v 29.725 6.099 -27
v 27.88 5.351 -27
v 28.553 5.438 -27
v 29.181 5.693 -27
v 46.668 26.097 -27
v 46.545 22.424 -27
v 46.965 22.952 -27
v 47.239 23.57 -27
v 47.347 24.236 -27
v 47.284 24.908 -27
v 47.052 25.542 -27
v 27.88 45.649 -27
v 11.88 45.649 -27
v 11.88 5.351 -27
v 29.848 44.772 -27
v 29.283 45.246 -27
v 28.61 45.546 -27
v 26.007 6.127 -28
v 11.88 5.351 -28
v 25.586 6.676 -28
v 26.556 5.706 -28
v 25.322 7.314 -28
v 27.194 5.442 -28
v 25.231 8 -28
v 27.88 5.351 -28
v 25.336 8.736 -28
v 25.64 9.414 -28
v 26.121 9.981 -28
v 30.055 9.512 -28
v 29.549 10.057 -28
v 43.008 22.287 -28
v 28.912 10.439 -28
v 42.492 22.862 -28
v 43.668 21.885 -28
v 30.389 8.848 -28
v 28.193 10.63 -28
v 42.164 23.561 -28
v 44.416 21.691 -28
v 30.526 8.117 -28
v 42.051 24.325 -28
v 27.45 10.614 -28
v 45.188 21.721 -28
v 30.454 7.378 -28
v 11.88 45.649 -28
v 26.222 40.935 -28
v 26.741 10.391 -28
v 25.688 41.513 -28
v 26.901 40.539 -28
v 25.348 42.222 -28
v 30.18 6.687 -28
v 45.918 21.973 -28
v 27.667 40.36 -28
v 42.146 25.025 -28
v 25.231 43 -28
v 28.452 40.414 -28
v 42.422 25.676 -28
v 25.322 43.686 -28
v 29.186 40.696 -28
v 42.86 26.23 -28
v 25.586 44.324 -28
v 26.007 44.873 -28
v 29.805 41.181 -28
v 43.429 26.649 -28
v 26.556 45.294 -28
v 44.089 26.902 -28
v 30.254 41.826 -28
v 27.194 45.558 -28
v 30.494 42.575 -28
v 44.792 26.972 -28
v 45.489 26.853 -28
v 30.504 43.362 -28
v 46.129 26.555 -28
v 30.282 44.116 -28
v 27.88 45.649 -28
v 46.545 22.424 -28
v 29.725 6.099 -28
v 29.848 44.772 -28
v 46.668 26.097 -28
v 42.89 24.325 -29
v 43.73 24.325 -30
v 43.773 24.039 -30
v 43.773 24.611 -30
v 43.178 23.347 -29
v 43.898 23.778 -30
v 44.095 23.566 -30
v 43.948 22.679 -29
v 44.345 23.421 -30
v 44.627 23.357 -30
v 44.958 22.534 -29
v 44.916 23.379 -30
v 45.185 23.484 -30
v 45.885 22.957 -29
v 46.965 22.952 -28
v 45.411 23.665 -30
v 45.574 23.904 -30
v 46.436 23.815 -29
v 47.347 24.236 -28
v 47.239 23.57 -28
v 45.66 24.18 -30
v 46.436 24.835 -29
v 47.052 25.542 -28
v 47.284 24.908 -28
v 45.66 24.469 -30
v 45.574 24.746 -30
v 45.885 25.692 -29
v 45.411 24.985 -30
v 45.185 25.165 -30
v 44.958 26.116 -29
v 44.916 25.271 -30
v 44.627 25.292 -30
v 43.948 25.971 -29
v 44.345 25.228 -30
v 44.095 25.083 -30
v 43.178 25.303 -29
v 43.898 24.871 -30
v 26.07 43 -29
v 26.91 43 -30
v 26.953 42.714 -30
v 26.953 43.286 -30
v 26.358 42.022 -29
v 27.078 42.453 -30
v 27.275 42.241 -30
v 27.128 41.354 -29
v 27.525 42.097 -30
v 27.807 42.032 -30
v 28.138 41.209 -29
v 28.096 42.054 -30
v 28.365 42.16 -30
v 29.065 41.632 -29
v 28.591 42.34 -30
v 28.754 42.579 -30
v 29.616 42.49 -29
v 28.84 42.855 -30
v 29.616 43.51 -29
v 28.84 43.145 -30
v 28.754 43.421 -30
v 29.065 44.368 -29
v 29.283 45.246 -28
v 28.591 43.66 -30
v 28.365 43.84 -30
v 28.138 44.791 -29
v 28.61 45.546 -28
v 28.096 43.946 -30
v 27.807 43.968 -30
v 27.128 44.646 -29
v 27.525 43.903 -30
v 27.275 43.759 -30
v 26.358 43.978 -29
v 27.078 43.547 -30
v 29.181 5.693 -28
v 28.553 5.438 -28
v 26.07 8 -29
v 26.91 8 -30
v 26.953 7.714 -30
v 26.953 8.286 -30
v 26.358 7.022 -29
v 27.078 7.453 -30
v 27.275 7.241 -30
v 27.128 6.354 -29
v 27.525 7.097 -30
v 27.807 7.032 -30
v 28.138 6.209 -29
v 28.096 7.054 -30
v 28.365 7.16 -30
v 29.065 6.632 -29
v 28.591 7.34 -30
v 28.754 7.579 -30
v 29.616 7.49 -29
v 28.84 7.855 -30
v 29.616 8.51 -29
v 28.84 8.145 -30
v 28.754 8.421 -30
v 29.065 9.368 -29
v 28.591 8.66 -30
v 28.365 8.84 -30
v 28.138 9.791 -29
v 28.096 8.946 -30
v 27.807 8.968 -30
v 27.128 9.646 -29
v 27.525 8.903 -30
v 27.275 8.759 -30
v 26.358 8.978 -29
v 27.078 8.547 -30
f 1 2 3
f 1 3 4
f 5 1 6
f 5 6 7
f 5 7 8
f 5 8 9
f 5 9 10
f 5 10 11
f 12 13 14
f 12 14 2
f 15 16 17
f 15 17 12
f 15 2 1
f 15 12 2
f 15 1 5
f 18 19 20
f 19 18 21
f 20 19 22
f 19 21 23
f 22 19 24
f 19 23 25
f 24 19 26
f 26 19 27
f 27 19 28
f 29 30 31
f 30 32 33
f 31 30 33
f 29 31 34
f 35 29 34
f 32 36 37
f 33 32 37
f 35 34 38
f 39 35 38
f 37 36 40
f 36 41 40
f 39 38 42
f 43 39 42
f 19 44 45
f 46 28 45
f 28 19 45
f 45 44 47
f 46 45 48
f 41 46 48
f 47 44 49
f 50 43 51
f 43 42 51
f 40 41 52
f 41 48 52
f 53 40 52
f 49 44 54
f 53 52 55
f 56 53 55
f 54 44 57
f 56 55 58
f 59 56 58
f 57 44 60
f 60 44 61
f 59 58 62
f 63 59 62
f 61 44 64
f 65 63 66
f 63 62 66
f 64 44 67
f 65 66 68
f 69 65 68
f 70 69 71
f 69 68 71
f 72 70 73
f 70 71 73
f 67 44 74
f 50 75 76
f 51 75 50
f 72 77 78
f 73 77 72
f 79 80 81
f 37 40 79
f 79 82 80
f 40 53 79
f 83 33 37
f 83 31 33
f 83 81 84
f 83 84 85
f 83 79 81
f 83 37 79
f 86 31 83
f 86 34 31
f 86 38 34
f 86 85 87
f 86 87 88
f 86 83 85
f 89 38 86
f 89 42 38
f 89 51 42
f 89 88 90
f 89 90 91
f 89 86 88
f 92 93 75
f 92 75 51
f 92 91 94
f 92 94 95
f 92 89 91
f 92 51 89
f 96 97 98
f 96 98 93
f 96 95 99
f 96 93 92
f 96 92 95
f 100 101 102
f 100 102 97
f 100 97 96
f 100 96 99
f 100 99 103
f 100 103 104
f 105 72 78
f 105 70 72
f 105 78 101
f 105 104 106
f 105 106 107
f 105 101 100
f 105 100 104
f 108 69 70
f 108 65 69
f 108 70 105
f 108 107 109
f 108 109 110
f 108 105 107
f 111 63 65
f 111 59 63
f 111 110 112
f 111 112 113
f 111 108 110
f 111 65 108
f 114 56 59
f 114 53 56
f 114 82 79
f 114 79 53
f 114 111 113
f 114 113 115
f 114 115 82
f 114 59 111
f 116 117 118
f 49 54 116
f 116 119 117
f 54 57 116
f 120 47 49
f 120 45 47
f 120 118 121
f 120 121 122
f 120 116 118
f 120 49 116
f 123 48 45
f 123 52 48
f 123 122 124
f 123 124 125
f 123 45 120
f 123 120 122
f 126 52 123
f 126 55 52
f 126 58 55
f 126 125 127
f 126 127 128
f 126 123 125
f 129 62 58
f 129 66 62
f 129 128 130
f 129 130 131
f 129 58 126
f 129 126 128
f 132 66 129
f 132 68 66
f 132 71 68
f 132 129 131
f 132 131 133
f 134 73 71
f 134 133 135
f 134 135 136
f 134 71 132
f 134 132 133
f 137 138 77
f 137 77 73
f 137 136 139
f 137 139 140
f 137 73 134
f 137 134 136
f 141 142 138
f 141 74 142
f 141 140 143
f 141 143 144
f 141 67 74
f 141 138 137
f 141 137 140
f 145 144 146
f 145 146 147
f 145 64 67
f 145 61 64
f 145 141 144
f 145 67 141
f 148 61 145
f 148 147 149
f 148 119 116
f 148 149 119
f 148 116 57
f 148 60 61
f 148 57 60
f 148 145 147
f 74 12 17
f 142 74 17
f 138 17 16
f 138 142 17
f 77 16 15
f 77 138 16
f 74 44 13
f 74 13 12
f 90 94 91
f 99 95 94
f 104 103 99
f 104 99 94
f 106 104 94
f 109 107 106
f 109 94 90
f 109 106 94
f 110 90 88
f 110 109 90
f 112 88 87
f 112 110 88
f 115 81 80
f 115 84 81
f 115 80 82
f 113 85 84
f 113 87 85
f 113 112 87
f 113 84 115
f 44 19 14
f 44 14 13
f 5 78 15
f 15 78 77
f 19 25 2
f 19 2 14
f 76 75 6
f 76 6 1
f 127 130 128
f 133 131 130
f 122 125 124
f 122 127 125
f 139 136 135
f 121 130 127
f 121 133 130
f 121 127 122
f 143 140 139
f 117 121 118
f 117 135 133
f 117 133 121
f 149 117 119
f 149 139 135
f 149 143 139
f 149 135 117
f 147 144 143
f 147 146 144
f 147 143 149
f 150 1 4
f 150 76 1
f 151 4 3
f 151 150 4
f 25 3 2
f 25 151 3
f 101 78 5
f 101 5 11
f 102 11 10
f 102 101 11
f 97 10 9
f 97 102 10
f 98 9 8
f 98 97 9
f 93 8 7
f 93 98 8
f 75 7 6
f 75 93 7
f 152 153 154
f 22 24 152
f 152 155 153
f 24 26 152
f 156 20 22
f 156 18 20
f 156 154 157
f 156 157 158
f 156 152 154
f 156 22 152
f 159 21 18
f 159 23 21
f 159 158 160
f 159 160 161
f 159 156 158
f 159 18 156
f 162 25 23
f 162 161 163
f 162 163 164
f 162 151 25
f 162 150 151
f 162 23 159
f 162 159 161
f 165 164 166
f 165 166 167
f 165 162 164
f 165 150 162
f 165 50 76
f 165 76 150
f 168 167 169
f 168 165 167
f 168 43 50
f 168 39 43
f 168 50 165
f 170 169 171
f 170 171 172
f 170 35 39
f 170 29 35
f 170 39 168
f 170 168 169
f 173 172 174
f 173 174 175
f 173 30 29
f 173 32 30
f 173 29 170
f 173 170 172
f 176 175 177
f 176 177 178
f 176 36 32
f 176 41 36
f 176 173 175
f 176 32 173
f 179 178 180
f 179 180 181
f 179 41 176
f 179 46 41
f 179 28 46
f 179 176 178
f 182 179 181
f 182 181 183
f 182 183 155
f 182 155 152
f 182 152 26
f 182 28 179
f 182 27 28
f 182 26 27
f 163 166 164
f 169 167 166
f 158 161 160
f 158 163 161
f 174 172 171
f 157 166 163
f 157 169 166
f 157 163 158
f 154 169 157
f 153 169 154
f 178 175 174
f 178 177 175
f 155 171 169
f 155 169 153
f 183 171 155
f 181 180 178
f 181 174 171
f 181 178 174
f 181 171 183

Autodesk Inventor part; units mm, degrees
ref_plane "YZ Plane" through (0, 0, 0) normal (1, 0, 0) x (0, 1, 0)
ref_plane "XZ Plane" through (0, 0, 0) normal (0, 1, 0) x (-1, 0, 0)
ref_plane "XY Plane" through (0, 0, 0) normal (0, 0, 1) x (1, 0, 0)
ref_plane "Work Plane1" through (0, 0, -28) normal (0, 0, 1) x (1, 0, 0)
sketch "Sketch1" plane through (0, 0, -28) normal (0, 0, 1) x (1, 0, 0)
  circle A0 centre (27.88, 8) radius 2.6486 projected
  circle A1 centre (27.88, 43) radius 2.6486 projected
  circle A2 centre (44.7, 24.3248) radius 2.6486 projected
  line L0 (27.88, 8) -> (44.7, 24.3248)
  line L1 (44.7, 24.3248) -> (27.88, 43)
  line L2 (27.88, 43) -> (27.88, 8)
  line L3 (46.5446, 22.4242) -> (29.7246, 6.0994)
  line L4 (46.668, 26.0973) -> (29.848, 44.7725)
  line L5 (27.88, 5.3514) -> (11.88, 5.3514)
  line L6 (27.88, 5.3514) -> (43.88, 5.3514) construction
  line L7 (11.88, 5.3514) -> (11.88, 45.6486)
  line L8 (11.88, 45.6486) -> (27.88, 45.6486)
  point P0 (0, 0)
  dimension "d0" = 16
  dimension "d1" = 180
extrude "Extrusion1" add sketch "Sketch1" along normal blind 1
sketch "Sketch2" plane through (0, 0, -28) normal (0, 0, -1) x (-1, 0, 0)
  circle A0 centre (-44.7, 24.3248) radius 2.6486 projected
  circle A1 centre (-27.88, 43) radius 2.6486 projected
  circle A2 centre (-27.88, 8) radius 2.6486 projected
  point P0 (0, 0)
extrude "Extrusion2" add sketch "Sketch2" along normal blind 2 draft -40
properties part number "20_Cube_Insert_VCM_MirrorMount_KES400A_mirror_mount"
